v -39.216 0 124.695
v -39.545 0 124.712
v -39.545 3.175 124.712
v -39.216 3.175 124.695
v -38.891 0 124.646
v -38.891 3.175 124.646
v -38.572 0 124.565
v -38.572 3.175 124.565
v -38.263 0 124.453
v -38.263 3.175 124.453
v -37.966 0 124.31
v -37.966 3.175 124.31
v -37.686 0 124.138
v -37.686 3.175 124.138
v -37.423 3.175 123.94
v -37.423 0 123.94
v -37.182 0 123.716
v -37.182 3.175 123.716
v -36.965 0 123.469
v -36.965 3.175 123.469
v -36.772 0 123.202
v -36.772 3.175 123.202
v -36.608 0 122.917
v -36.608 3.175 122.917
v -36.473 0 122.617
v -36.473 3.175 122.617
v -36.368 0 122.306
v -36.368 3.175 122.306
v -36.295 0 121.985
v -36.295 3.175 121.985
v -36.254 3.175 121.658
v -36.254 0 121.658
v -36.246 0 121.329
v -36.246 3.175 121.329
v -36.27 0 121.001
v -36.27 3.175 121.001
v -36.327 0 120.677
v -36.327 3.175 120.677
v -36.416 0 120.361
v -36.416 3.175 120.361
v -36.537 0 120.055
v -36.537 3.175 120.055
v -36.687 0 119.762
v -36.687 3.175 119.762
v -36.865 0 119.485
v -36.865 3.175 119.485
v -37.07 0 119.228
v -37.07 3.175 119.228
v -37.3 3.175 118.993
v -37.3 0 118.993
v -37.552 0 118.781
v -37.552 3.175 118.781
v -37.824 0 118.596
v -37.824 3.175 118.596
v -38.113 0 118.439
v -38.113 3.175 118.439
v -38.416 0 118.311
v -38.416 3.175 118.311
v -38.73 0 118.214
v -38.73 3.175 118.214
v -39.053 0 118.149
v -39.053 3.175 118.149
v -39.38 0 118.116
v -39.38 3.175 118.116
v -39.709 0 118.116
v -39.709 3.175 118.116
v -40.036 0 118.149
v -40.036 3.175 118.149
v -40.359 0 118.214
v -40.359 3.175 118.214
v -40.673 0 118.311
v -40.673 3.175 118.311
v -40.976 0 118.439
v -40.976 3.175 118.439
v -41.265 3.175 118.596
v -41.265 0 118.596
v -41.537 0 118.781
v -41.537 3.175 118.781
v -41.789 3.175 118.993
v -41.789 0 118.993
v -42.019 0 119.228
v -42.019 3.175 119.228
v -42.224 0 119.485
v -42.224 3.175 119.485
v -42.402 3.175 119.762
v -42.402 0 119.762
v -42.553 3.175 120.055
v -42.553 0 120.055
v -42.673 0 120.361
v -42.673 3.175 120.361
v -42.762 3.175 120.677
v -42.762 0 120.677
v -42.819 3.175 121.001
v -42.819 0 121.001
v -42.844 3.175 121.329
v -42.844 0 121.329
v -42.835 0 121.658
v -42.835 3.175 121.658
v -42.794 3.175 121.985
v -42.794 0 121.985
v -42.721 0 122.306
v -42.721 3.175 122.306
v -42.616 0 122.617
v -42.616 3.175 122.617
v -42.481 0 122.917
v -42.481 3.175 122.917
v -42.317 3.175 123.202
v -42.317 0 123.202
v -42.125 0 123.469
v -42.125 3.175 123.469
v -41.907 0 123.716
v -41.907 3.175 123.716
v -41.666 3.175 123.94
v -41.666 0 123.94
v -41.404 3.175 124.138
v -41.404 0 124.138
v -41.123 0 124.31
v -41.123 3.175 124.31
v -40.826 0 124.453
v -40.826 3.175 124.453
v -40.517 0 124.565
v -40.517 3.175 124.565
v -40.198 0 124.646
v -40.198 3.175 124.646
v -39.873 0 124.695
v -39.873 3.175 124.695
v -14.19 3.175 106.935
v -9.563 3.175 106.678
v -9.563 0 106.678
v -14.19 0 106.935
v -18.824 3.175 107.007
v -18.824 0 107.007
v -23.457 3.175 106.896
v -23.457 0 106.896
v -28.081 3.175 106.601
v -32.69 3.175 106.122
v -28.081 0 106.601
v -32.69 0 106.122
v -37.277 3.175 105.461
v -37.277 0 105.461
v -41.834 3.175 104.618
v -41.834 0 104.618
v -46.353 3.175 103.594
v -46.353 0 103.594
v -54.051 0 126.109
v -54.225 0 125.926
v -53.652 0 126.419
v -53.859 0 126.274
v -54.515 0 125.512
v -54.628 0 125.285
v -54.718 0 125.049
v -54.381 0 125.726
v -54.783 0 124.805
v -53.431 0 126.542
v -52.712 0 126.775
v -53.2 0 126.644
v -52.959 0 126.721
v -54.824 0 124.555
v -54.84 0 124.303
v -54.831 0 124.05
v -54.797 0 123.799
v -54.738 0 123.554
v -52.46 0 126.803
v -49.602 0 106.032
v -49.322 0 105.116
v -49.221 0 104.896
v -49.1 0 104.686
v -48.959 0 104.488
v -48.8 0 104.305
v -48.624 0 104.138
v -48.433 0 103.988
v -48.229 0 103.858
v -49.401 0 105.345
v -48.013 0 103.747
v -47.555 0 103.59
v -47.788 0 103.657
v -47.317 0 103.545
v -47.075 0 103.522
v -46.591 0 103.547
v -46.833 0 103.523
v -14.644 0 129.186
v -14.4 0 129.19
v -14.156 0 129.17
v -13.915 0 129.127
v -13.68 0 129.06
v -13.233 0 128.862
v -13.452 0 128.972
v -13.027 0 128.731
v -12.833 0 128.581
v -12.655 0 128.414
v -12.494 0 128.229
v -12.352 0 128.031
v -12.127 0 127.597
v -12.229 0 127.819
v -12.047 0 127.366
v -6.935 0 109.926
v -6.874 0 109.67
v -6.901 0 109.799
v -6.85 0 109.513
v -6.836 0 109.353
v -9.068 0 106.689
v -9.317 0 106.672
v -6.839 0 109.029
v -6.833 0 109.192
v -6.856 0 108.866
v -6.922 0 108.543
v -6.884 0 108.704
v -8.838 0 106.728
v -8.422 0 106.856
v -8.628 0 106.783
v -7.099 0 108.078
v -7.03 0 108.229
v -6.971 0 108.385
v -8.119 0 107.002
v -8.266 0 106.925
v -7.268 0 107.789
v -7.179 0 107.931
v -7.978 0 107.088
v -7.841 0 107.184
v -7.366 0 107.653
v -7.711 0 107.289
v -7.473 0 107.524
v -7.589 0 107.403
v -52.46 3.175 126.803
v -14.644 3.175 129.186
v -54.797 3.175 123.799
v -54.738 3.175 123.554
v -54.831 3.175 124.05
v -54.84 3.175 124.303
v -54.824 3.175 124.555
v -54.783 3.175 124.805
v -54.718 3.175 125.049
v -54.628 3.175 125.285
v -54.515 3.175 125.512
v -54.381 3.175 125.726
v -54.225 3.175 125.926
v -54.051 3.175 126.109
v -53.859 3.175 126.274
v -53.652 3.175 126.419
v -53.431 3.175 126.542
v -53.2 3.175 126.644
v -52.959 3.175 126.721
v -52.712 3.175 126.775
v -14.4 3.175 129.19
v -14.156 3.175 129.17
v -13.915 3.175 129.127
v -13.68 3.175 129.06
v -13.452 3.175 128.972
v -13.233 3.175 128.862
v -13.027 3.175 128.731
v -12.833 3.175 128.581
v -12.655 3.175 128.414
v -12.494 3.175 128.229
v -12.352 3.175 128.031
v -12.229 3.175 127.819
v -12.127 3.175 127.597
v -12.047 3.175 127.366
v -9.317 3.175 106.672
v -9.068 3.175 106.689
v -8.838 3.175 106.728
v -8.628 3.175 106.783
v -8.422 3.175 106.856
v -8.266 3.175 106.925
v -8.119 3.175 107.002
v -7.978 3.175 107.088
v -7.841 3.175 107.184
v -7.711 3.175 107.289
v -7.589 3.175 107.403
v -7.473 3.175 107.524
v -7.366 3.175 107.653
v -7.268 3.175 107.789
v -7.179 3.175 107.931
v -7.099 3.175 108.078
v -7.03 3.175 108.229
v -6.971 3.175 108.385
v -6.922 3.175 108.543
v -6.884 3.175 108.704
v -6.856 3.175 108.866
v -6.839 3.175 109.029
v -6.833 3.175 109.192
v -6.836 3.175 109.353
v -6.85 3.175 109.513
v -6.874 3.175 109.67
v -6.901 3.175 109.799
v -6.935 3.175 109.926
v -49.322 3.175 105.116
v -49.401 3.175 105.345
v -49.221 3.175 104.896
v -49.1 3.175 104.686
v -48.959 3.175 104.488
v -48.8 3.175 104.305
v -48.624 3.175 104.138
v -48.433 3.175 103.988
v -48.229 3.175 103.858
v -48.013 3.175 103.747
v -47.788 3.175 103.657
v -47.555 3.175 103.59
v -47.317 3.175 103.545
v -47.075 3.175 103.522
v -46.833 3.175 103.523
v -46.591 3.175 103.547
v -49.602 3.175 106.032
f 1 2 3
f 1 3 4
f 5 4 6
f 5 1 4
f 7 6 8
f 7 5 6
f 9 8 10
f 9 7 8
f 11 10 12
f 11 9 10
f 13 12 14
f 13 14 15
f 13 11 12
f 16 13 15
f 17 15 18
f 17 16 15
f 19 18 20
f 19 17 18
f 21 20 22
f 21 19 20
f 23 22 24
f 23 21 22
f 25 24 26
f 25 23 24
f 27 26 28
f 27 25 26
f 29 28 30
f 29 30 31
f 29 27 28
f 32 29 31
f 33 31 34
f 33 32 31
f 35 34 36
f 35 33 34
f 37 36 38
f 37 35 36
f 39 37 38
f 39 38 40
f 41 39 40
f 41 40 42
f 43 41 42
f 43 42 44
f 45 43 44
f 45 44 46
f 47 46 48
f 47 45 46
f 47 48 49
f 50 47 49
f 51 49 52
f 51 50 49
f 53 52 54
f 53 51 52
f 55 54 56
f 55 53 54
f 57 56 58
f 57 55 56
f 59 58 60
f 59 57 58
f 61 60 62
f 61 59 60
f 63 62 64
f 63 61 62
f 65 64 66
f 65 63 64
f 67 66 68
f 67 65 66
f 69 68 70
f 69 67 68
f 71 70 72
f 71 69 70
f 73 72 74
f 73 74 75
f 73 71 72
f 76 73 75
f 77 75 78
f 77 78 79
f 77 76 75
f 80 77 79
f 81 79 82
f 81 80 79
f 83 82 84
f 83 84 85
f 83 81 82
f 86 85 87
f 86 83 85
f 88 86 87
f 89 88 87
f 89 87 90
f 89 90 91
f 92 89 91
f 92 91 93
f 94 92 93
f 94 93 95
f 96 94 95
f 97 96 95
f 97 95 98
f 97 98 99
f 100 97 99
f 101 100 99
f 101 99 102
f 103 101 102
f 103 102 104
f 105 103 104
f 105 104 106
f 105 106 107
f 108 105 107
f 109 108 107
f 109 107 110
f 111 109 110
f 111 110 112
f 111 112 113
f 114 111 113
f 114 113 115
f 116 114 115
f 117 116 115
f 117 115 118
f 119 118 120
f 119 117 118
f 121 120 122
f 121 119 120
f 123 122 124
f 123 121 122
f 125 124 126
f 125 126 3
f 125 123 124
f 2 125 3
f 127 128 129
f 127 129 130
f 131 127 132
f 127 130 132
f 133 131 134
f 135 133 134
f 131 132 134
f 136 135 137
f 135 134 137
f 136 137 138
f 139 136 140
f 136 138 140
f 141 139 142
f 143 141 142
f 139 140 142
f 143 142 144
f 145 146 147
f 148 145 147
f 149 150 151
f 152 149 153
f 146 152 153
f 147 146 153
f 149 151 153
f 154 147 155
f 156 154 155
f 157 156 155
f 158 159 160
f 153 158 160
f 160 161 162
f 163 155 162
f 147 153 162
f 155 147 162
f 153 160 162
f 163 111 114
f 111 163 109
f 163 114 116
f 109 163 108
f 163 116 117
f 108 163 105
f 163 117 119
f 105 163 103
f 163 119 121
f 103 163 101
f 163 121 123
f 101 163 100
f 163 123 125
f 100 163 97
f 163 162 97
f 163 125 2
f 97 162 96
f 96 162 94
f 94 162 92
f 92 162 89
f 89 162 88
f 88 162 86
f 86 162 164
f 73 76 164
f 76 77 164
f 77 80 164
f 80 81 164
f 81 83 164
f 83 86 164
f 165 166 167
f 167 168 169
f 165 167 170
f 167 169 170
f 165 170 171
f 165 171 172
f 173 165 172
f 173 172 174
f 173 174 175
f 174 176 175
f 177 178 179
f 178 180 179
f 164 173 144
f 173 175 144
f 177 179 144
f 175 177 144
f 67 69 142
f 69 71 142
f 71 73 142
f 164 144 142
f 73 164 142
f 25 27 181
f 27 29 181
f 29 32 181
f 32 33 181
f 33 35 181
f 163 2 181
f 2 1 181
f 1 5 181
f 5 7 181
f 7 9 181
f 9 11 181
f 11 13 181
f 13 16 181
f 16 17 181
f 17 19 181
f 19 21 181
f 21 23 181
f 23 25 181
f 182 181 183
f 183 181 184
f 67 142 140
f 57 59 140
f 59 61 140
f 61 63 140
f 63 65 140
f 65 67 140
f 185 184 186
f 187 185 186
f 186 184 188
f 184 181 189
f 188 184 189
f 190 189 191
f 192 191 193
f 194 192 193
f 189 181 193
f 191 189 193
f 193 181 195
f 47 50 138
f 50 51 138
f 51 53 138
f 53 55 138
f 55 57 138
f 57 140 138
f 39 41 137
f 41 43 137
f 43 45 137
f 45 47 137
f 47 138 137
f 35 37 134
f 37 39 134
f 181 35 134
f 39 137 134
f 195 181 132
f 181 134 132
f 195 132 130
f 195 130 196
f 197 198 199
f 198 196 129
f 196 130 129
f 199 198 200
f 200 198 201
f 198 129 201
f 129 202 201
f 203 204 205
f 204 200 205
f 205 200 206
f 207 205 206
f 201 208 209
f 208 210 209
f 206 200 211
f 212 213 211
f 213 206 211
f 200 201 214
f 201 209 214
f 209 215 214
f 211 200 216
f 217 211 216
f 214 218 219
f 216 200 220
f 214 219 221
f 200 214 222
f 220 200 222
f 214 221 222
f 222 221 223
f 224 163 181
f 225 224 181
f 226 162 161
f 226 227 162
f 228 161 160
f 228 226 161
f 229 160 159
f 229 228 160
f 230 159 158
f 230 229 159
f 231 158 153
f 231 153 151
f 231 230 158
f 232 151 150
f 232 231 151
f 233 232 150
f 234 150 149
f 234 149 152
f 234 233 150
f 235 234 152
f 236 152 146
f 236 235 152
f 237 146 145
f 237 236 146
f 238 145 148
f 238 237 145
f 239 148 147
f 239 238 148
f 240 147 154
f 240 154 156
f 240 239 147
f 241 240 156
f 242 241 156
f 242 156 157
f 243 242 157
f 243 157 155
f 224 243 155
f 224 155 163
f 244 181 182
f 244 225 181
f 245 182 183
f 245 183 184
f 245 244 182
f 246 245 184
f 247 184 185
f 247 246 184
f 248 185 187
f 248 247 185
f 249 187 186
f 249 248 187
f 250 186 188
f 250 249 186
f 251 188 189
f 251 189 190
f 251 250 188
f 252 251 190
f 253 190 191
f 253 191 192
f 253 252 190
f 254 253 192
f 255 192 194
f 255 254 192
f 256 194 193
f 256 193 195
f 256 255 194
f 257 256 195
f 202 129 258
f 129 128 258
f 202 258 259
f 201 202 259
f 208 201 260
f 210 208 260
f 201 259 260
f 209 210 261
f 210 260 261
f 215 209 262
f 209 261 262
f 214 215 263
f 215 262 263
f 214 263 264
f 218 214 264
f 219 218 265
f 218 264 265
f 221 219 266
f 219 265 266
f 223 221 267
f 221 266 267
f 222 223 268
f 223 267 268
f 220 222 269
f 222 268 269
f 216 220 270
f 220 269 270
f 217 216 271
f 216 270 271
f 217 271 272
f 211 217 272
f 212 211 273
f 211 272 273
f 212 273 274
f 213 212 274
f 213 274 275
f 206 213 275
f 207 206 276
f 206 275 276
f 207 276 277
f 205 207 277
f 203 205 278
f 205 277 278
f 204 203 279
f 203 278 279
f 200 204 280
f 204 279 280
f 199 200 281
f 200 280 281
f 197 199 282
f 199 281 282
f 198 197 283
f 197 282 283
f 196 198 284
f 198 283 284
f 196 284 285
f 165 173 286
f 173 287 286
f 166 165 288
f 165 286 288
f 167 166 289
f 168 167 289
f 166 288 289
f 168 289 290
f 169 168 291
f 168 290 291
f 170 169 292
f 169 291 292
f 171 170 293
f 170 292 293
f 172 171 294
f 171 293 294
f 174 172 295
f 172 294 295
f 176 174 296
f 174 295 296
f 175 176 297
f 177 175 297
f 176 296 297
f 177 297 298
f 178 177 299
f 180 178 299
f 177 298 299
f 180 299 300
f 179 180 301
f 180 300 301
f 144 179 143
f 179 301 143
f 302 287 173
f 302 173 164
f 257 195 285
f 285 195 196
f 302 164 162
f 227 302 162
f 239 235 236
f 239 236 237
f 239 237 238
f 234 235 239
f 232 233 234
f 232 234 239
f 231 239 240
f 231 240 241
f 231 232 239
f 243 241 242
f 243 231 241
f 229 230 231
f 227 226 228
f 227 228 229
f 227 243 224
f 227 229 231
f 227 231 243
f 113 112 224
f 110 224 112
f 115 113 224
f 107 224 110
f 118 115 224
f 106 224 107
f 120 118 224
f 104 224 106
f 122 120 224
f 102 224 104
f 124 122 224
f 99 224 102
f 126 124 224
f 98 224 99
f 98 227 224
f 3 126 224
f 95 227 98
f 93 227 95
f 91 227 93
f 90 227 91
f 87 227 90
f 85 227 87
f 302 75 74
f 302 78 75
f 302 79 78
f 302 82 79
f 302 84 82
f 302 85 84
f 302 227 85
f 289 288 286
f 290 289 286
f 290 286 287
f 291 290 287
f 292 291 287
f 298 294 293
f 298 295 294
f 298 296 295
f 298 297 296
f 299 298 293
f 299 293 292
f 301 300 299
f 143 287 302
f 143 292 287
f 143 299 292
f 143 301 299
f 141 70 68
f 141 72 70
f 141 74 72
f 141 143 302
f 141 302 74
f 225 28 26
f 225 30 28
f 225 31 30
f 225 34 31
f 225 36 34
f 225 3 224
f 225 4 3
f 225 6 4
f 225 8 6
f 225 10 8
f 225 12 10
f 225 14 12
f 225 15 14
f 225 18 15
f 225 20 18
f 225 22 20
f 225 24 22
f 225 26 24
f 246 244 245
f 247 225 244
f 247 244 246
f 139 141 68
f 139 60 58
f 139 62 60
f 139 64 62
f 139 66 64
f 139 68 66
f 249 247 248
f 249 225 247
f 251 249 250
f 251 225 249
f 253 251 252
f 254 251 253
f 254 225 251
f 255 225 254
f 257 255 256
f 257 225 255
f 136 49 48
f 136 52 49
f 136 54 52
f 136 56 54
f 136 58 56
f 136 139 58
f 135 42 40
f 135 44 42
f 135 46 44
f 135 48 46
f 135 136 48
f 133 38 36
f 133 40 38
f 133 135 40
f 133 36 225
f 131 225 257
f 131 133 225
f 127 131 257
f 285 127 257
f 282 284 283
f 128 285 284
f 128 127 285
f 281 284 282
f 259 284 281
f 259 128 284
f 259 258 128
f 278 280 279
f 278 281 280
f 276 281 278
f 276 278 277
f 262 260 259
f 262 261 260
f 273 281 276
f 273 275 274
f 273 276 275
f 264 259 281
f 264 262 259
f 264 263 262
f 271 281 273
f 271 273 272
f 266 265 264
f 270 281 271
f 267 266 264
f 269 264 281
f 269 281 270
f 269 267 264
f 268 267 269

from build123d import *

# Parameters (mm, degrees)
SKETCH1_R           = 3.3
BOSS_EXTRUDE1_DEPTH = 3.175
FILLET1_R           = 2.54


with BuildPart() as part:
    # Sketch1 → Boss-Extrude1 (new body)
    with BuildSketch(Plane(origin=(0, 0, 0), x_dir=(1, 0, 0), z_dir=(0, 1, 0))):
        with BuildLine():
            Line((-48.70903707, -102.985419006), (-49.602131042, -106.032221946))
            Line((-49.602131042, -106.032221946), (-55.631977257, -126.603129099))
            Line((-55.631977257, -126.603129099), (-12.618209883, -129.313914375))
            Line((-12.618209883, -129.313914375), (-6.890929076, -109.775213464))
            Line((-6.890929076, -109.775213464), (-5.88465666, -106.342300635))
            ThreePointArc((-5.88465666, -106.342300635), (-27.452664405, -106.651653953), (-48.70903707, -102.985419006))
        make_face()
        with Locations(Location((-39.544579652, -121.411764721, 0), (0, 0, 270))):
            Circle(SKETCH1_R, mode=Mode.SUBTRACT)
    extrude(amount=BOSS_EXTRUDE1_DEPTH)

    # Fillet1
    fillet1_edges = [part.edges().sort_by_distance(p)[0] for p in [
        (-5.88465666, 1.5875, 106.342300635),
        (-12.618209883, 1.5875, 129.313914375),
        (-55.631977257, 1.5875, 126.603129099),
        (-48.70903707, 1.5875, 102.985419006),
    ]]
    fillet(fillet1_edges, radius=FILLET1_R)


solid = part.part
